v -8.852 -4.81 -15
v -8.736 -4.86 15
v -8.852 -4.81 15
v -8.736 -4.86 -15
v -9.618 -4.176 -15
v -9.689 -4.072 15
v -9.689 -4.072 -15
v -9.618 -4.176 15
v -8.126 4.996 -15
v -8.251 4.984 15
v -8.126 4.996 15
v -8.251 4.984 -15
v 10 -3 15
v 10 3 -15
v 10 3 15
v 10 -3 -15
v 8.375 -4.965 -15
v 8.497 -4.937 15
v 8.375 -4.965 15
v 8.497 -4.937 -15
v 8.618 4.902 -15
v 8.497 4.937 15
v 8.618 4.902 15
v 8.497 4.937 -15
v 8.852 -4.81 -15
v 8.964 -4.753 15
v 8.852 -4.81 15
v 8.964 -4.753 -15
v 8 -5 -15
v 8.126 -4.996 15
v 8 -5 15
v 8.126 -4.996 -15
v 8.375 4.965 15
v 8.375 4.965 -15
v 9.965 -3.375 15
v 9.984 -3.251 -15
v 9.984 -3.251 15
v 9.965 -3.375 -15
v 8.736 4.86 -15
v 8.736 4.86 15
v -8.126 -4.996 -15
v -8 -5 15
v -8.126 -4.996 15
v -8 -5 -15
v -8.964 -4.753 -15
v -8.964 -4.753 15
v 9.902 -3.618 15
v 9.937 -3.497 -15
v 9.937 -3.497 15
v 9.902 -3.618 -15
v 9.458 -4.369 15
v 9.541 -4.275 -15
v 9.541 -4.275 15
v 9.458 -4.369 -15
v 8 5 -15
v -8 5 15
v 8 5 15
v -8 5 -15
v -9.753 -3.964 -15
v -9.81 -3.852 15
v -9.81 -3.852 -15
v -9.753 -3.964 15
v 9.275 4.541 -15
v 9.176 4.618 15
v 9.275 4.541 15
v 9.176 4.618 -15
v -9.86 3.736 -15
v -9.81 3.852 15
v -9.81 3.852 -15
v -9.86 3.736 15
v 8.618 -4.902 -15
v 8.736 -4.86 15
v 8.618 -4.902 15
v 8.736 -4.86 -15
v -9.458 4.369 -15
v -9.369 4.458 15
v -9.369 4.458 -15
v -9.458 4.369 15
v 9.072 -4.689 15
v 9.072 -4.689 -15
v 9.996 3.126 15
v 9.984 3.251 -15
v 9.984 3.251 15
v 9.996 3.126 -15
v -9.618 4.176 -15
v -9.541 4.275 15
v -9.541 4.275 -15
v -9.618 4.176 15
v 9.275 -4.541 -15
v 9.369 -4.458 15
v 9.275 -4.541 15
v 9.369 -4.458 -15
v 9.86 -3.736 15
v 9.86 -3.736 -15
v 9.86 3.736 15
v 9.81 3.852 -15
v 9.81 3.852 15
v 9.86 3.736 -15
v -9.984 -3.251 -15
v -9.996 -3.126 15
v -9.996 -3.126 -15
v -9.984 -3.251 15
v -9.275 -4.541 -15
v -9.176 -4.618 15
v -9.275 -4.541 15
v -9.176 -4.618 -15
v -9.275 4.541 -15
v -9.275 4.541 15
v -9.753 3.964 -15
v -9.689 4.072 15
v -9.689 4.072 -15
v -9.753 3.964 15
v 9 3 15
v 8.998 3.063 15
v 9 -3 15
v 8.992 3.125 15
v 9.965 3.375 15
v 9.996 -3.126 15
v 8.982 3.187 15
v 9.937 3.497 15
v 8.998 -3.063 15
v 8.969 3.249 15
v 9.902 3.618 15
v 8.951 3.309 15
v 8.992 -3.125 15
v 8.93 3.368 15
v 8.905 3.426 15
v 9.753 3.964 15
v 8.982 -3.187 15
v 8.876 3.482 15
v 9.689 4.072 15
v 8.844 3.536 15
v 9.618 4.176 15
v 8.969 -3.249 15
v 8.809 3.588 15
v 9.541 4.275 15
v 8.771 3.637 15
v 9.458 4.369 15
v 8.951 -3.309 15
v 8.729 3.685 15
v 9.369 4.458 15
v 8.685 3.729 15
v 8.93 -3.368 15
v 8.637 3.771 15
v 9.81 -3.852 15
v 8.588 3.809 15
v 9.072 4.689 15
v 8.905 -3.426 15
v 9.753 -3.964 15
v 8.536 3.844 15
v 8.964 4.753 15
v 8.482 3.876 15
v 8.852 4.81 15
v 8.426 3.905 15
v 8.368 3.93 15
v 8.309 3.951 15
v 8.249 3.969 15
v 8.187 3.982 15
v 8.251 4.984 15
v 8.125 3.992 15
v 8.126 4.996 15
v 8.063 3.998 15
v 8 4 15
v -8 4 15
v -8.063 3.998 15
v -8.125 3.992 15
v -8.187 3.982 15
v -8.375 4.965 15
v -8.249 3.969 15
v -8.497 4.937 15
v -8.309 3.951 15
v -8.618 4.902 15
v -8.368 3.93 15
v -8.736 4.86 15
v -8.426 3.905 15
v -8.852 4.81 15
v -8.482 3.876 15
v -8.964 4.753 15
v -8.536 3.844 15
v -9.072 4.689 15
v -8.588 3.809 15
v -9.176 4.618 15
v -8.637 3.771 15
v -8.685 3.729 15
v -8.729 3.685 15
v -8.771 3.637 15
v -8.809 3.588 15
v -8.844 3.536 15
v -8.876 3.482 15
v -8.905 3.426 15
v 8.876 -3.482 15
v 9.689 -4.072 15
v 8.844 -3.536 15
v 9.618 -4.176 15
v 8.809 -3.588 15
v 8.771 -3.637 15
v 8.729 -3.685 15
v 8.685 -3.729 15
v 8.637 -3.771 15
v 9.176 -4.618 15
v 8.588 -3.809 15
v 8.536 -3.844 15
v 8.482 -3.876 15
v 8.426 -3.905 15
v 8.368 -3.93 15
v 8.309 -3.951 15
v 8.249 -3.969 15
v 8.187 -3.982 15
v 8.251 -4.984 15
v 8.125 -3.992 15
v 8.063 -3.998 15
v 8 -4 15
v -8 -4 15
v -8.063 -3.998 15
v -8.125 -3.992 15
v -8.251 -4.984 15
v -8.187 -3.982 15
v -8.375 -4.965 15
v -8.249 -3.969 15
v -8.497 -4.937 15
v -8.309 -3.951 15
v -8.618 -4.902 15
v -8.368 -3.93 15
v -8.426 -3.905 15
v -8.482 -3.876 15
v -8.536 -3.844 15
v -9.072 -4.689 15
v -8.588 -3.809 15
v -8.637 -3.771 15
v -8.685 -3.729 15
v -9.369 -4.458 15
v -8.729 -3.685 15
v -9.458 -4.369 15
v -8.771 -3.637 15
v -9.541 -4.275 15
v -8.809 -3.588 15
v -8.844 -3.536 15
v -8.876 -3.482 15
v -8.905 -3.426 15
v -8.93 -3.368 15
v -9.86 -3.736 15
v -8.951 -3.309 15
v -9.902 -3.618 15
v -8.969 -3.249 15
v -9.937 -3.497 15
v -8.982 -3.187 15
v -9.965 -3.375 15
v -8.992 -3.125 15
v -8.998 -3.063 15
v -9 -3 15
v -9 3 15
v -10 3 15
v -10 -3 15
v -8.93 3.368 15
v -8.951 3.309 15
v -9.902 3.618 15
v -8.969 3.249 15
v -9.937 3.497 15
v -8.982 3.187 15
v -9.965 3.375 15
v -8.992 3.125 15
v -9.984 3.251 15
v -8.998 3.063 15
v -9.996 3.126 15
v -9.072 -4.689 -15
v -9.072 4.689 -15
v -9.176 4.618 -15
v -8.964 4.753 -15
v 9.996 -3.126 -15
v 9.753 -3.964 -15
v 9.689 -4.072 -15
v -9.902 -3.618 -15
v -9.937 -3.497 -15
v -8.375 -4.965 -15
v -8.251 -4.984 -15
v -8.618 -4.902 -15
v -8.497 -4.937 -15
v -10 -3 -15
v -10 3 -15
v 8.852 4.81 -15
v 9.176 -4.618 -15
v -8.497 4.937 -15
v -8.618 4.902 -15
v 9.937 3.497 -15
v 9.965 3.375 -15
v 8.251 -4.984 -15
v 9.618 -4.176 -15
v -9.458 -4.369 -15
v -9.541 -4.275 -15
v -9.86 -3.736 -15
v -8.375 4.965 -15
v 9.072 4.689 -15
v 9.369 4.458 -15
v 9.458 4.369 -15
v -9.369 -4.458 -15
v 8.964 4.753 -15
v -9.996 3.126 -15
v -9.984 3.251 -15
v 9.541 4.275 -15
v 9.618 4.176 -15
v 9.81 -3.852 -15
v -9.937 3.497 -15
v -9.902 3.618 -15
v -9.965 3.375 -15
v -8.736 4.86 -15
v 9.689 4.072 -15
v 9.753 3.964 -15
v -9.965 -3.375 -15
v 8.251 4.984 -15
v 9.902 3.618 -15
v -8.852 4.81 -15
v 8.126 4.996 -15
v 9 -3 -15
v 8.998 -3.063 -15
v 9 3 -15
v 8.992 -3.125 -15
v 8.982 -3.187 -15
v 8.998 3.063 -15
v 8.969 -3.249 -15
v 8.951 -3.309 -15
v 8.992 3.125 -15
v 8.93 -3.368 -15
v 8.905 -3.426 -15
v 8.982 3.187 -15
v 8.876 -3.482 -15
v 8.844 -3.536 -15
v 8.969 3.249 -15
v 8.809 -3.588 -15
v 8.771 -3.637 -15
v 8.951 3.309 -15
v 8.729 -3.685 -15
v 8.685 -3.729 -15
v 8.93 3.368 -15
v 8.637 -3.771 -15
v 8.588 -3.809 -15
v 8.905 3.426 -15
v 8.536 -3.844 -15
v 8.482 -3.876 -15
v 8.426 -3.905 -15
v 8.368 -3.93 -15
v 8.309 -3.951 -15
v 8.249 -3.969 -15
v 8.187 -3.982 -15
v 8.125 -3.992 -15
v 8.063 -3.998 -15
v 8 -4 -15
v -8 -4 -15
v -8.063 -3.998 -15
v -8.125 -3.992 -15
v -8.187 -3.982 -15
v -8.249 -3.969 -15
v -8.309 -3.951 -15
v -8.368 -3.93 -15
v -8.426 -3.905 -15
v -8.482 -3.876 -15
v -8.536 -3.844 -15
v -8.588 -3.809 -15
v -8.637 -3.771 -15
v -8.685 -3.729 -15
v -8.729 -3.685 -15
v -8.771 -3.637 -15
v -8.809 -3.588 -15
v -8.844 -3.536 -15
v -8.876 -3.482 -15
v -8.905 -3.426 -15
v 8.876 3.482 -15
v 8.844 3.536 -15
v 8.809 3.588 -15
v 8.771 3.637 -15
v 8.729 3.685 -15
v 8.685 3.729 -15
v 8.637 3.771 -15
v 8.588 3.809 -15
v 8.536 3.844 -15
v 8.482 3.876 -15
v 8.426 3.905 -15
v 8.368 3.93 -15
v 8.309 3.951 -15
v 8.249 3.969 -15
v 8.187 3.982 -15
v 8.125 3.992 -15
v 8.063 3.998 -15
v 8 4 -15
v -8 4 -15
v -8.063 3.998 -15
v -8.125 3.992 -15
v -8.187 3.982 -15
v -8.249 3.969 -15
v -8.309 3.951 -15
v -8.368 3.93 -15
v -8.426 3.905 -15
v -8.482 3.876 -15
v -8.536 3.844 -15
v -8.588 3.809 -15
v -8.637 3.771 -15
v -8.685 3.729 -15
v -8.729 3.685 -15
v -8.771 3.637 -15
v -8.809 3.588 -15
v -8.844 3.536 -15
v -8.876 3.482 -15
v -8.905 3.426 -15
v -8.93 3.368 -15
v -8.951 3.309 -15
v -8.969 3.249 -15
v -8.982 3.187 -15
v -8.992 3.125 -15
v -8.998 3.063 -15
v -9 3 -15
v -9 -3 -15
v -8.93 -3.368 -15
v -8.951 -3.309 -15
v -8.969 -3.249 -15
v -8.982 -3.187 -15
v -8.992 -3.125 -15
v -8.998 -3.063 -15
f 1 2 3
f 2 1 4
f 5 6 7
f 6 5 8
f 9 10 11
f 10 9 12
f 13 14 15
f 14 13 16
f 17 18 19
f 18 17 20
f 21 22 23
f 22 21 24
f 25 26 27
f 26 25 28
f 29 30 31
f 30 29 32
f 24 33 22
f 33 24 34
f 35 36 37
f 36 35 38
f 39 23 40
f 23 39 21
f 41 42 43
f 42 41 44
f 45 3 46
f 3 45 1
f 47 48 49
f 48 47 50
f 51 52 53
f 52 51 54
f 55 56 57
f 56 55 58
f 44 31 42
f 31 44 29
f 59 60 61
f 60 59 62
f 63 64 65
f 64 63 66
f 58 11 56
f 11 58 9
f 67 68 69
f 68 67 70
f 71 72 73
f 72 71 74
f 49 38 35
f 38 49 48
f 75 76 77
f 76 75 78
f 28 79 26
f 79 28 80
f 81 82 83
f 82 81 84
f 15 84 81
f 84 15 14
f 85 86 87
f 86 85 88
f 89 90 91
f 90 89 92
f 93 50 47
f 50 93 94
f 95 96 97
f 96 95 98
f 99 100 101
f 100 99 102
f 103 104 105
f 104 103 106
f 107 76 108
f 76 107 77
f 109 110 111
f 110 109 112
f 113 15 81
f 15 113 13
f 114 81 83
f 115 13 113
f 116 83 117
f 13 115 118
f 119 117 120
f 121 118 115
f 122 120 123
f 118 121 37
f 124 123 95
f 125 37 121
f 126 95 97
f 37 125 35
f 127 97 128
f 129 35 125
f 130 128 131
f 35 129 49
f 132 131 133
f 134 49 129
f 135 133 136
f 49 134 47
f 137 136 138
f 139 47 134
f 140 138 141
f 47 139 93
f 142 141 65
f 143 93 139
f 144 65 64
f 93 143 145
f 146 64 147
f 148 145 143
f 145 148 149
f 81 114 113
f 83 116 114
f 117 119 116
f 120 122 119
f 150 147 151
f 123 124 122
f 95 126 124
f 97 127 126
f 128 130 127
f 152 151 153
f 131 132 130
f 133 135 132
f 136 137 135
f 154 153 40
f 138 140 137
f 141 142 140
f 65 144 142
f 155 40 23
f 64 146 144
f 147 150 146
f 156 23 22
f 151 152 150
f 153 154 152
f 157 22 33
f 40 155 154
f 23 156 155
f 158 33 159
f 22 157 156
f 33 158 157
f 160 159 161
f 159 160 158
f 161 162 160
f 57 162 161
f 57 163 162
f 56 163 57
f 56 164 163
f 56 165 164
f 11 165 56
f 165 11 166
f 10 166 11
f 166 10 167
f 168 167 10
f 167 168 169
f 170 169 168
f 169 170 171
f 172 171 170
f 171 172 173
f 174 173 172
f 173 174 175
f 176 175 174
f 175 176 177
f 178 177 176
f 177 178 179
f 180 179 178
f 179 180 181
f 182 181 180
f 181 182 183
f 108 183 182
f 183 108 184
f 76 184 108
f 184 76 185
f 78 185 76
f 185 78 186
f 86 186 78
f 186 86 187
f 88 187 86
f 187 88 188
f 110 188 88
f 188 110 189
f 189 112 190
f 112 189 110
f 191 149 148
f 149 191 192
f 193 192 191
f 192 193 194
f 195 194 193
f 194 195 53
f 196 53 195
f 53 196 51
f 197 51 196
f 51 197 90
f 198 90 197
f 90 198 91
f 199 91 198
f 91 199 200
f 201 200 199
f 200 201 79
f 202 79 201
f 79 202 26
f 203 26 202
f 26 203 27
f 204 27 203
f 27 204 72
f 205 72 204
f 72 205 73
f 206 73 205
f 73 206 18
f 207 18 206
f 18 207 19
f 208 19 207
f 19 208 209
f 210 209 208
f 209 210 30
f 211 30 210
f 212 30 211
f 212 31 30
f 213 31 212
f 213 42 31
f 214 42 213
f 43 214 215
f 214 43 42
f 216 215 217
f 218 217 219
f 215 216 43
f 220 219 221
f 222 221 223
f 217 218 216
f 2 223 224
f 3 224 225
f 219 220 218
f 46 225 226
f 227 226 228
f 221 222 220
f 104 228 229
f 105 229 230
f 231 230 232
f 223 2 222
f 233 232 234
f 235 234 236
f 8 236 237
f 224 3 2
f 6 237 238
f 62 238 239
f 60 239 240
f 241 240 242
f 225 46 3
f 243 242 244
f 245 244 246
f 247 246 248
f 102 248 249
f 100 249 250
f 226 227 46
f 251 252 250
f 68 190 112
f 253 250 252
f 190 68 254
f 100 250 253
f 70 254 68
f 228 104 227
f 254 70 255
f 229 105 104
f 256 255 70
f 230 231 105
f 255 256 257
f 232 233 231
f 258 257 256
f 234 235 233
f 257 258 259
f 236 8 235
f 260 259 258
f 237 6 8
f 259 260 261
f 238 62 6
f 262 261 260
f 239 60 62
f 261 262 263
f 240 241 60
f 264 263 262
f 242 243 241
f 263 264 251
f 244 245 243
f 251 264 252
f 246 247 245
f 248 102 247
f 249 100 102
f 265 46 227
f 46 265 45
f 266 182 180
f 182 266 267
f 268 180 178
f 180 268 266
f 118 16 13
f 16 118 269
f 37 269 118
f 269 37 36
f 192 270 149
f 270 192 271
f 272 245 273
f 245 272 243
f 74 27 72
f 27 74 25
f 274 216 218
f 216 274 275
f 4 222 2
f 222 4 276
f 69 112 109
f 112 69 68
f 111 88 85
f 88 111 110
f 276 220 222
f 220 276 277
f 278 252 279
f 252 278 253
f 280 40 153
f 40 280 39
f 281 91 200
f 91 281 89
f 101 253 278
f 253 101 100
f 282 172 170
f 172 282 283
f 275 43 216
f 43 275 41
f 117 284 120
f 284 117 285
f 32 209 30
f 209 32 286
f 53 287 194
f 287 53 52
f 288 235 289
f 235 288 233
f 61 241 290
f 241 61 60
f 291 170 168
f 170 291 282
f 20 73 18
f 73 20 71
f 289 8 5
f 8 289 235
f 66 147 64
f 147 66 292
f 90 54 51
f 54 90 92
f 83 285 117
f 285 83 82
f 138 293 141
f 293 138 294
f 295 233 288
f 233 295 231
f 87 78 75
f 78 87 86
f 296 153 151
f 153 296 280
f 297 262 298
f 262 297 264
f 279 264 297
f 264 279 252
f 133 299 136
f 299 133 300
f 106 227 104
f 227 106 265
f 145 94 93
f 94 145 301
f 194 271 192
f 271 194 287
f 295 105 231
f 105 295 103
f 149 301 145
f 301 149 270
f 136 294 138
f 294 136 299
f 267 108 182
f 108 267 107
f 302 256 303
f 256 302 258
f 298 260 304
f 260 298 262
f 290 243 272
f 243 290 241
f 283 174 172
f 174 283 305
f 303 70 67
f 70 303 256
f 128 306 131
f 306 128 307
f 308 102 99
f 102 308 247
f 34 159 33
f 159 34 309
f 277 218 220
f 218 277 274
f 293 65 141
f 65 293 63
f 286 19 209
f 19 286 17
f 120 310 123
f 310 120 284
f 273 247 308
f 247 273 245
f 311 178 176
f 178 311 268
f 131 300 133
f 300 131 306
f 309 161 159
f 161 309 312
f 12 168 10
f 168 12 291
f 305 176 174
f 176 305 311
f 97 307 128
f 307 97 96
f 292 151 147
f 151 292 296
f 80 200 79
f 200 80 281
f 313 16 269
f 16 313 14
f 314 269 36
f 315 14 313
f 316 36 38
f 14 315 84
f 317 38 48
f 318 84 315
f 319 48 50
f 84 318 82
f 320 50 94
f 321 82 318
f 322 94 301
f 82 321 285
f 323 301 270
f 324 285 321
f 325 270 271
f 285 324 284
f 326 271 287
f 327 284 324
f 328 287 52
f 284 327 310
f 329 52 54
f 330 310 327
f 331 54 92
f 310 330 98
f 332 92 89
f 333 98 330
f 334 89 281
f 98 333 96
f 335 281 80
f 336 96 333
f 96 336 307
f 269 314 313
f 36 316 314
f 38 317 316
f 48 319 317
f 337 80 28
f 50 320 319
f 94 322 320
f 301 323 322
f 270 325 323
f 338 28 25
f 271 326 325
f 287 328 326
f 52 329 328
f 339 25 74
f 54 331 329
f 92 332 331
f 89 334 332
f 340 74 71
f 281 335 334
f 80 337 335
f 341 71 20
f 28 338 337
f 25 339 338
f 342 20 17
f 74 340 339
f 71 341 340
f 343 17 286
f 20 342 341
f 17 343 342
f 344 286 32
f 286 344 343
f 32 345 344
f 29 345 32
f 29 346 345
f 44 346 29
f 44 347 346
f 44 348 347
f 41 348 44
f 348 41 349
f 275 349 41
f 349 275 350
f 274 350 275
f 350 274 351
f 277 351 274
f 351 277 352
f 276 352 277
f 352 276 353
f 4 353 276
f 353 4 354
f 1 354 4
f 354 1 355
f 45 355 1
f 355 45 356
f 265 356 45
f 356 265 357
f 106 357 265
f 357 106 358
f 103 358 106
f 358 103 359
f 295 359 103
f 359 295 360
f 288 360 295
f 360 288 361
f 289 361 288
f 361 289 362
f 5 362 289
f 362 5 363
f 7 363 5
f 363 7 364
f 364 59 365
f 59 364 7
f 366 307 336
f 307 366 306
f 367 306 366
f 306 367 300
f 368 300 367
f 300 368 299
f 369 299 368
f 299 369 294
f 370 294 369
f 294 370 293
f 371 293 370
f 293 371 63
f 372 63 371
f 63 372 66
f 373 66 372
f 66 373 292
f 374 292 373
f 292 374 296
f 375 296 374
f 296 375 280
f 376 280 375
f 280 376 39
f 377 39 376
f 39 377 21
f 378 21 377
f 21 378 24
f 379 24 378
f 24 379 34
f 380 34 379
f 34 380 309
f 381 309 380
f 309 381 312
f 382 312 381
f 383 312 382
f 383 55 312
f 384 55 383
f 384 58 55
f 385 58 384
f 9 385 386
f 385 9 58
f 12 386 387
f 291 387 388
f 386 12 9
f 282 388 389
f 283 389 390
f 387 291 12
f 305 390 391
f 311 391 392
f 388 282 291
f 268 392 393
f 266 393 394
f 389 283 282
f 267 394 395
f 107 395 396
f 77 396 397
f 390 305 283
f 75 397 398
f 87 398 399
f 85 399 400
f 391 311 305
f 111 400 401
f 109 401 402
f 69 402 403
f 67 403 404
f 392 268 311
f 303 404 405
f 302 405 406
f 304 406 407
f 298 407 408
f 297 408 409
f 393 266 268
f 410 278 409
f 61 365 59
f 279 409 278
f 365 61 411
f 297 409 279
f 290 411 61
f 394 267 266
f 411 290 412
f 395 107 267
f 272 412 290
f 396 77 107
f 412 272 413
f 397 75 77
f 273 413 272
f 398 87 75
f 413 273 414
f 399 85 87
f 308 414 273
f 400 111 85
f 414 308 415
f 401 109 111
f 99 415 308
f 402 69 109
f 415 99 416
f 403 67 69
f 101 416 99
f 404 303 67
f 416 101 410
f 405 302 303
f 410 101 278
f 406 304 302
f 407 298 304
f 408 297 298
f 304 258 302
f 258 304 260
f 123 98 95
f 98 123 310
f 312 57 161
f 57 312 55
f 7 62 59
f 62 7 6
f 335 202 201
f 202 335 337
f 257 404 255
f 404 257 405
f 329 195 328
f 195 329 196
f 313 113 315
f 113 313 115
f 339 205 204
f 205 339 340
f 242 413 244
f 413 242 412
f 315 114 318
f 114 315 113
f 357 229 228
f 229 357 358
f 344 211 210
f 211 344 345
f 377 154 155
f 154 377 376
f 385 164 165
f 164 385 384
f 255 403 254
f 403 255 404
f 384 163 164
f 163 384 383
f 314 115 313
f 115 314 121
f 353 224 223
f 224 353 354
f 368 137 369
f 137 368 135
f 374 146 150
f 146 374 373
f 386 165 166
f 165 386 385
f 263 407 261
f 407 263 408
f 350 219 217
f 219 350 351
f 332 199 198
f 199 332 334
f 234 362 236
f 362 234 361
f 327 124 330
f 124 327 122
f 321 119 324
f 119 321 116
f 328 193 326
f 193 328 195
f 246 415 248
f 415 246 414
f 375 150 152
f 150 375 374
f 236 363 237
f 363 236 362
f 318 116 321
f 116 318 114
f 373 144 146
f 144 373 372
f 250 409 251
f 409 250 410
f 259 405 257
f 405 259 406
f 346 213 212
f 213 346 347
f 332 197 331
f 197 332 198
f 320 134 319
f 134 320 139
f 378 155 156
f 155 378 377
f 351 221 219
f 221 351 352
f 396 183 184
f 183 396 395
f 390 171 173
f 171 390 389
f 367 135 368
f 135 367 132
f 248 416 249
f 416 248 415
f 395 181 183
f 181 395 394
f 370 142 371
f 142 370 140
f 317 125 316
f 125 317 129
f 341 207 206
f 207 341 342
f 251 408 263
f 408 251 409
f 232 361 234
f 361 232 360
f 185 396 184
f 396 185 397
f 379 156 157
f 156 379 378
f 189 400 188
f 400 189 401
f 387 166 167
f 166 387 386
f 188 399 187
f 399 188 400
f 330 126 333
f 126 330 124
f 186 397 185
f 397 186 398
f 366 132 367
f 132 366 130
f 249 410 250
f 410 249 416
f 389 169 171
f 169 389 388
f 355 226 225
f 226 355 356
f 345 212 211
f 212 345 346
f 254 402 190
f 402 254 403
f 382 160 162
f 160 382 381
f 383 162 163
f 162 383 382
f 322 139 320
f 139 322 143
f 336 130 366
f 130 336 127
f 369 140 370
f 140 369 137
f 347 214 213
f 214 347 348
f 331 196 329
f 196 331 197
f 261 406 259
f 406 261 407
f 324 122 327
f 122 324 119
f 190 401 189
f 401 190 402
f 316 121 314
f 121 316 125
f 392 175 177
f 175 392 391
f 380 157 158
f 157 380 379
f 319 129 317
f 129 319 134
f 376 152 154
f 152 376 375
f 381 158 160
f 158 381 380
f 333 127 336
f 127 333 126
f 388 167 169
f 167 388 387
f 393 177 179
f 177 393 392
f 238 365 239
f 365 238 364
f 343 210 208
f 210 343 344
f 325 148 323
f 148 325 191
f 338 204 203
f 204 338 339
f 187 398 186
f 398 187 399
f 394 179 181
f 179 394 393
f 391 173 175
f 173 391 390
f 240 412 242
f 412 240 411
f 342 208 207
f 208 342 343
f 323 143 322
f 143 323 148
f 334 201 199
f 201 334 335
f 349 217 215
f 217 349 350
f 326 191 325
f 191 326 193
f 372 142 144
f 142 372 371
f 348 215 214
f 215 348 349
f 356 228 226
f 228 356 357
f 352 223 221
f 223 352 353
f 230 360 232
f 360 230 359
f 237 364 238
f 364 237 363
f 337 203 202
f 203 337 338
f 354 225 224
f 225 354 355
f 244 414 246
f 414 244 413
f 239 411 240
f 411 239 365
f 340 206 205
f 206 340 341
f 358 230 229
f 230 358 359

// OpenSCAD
// variables
length = 20; // [10:400]
width = 10; // [10:400]
height = 30; // [1:400]
radius = 2; // [2:31]
wallthickness = 1; // [1:30]
// model
difference(){
	hull(){
		translate([(length-2*radius)/2,(width-2*radius)/2,0]) cylinder(h=height,d=2*radius,center=true,$fn=100);
		translate([-(length-2*radius)/2,(width-2*radius)/2,0]) cylinder(h=height,d=2*radius,center=true,$fn=100);
		translate([(length-2*radius)/2,-(width-2*radius)/2,0]) cylinder(h=height,d=2*radius,center=true,$fn=100);
		translate([-(length-2*radius)/2,-(width-2*radius)/2,0]) cylinder(h=height,d=2*radius,center=true,$fn=100);
	}
	hull(){
		translate([(length-2*radius)/2,(width-2*radius)/2,0]) cylinder(h=height,d=2*(radius-wallthickness),center=true,$fn=100);
		translate([-(length-2*radius)/2,(width-2*radius)/2,0]) cylinder(h=height,d=2*(radius-wallthickness),center=true,$fn=100);
		translate([(length-2*radius)/2,-(width-2*radius)/2,0]) cylinder(h=height,d=2*(radius-wallthickness),center=true,$fn=100);
		translate([-(length-2*radius)/2,-(width-2*radius)/2,0]) cylinder(h=height,d=2*(radius-wallthickness),center=true,$fn=100);
	}
}
